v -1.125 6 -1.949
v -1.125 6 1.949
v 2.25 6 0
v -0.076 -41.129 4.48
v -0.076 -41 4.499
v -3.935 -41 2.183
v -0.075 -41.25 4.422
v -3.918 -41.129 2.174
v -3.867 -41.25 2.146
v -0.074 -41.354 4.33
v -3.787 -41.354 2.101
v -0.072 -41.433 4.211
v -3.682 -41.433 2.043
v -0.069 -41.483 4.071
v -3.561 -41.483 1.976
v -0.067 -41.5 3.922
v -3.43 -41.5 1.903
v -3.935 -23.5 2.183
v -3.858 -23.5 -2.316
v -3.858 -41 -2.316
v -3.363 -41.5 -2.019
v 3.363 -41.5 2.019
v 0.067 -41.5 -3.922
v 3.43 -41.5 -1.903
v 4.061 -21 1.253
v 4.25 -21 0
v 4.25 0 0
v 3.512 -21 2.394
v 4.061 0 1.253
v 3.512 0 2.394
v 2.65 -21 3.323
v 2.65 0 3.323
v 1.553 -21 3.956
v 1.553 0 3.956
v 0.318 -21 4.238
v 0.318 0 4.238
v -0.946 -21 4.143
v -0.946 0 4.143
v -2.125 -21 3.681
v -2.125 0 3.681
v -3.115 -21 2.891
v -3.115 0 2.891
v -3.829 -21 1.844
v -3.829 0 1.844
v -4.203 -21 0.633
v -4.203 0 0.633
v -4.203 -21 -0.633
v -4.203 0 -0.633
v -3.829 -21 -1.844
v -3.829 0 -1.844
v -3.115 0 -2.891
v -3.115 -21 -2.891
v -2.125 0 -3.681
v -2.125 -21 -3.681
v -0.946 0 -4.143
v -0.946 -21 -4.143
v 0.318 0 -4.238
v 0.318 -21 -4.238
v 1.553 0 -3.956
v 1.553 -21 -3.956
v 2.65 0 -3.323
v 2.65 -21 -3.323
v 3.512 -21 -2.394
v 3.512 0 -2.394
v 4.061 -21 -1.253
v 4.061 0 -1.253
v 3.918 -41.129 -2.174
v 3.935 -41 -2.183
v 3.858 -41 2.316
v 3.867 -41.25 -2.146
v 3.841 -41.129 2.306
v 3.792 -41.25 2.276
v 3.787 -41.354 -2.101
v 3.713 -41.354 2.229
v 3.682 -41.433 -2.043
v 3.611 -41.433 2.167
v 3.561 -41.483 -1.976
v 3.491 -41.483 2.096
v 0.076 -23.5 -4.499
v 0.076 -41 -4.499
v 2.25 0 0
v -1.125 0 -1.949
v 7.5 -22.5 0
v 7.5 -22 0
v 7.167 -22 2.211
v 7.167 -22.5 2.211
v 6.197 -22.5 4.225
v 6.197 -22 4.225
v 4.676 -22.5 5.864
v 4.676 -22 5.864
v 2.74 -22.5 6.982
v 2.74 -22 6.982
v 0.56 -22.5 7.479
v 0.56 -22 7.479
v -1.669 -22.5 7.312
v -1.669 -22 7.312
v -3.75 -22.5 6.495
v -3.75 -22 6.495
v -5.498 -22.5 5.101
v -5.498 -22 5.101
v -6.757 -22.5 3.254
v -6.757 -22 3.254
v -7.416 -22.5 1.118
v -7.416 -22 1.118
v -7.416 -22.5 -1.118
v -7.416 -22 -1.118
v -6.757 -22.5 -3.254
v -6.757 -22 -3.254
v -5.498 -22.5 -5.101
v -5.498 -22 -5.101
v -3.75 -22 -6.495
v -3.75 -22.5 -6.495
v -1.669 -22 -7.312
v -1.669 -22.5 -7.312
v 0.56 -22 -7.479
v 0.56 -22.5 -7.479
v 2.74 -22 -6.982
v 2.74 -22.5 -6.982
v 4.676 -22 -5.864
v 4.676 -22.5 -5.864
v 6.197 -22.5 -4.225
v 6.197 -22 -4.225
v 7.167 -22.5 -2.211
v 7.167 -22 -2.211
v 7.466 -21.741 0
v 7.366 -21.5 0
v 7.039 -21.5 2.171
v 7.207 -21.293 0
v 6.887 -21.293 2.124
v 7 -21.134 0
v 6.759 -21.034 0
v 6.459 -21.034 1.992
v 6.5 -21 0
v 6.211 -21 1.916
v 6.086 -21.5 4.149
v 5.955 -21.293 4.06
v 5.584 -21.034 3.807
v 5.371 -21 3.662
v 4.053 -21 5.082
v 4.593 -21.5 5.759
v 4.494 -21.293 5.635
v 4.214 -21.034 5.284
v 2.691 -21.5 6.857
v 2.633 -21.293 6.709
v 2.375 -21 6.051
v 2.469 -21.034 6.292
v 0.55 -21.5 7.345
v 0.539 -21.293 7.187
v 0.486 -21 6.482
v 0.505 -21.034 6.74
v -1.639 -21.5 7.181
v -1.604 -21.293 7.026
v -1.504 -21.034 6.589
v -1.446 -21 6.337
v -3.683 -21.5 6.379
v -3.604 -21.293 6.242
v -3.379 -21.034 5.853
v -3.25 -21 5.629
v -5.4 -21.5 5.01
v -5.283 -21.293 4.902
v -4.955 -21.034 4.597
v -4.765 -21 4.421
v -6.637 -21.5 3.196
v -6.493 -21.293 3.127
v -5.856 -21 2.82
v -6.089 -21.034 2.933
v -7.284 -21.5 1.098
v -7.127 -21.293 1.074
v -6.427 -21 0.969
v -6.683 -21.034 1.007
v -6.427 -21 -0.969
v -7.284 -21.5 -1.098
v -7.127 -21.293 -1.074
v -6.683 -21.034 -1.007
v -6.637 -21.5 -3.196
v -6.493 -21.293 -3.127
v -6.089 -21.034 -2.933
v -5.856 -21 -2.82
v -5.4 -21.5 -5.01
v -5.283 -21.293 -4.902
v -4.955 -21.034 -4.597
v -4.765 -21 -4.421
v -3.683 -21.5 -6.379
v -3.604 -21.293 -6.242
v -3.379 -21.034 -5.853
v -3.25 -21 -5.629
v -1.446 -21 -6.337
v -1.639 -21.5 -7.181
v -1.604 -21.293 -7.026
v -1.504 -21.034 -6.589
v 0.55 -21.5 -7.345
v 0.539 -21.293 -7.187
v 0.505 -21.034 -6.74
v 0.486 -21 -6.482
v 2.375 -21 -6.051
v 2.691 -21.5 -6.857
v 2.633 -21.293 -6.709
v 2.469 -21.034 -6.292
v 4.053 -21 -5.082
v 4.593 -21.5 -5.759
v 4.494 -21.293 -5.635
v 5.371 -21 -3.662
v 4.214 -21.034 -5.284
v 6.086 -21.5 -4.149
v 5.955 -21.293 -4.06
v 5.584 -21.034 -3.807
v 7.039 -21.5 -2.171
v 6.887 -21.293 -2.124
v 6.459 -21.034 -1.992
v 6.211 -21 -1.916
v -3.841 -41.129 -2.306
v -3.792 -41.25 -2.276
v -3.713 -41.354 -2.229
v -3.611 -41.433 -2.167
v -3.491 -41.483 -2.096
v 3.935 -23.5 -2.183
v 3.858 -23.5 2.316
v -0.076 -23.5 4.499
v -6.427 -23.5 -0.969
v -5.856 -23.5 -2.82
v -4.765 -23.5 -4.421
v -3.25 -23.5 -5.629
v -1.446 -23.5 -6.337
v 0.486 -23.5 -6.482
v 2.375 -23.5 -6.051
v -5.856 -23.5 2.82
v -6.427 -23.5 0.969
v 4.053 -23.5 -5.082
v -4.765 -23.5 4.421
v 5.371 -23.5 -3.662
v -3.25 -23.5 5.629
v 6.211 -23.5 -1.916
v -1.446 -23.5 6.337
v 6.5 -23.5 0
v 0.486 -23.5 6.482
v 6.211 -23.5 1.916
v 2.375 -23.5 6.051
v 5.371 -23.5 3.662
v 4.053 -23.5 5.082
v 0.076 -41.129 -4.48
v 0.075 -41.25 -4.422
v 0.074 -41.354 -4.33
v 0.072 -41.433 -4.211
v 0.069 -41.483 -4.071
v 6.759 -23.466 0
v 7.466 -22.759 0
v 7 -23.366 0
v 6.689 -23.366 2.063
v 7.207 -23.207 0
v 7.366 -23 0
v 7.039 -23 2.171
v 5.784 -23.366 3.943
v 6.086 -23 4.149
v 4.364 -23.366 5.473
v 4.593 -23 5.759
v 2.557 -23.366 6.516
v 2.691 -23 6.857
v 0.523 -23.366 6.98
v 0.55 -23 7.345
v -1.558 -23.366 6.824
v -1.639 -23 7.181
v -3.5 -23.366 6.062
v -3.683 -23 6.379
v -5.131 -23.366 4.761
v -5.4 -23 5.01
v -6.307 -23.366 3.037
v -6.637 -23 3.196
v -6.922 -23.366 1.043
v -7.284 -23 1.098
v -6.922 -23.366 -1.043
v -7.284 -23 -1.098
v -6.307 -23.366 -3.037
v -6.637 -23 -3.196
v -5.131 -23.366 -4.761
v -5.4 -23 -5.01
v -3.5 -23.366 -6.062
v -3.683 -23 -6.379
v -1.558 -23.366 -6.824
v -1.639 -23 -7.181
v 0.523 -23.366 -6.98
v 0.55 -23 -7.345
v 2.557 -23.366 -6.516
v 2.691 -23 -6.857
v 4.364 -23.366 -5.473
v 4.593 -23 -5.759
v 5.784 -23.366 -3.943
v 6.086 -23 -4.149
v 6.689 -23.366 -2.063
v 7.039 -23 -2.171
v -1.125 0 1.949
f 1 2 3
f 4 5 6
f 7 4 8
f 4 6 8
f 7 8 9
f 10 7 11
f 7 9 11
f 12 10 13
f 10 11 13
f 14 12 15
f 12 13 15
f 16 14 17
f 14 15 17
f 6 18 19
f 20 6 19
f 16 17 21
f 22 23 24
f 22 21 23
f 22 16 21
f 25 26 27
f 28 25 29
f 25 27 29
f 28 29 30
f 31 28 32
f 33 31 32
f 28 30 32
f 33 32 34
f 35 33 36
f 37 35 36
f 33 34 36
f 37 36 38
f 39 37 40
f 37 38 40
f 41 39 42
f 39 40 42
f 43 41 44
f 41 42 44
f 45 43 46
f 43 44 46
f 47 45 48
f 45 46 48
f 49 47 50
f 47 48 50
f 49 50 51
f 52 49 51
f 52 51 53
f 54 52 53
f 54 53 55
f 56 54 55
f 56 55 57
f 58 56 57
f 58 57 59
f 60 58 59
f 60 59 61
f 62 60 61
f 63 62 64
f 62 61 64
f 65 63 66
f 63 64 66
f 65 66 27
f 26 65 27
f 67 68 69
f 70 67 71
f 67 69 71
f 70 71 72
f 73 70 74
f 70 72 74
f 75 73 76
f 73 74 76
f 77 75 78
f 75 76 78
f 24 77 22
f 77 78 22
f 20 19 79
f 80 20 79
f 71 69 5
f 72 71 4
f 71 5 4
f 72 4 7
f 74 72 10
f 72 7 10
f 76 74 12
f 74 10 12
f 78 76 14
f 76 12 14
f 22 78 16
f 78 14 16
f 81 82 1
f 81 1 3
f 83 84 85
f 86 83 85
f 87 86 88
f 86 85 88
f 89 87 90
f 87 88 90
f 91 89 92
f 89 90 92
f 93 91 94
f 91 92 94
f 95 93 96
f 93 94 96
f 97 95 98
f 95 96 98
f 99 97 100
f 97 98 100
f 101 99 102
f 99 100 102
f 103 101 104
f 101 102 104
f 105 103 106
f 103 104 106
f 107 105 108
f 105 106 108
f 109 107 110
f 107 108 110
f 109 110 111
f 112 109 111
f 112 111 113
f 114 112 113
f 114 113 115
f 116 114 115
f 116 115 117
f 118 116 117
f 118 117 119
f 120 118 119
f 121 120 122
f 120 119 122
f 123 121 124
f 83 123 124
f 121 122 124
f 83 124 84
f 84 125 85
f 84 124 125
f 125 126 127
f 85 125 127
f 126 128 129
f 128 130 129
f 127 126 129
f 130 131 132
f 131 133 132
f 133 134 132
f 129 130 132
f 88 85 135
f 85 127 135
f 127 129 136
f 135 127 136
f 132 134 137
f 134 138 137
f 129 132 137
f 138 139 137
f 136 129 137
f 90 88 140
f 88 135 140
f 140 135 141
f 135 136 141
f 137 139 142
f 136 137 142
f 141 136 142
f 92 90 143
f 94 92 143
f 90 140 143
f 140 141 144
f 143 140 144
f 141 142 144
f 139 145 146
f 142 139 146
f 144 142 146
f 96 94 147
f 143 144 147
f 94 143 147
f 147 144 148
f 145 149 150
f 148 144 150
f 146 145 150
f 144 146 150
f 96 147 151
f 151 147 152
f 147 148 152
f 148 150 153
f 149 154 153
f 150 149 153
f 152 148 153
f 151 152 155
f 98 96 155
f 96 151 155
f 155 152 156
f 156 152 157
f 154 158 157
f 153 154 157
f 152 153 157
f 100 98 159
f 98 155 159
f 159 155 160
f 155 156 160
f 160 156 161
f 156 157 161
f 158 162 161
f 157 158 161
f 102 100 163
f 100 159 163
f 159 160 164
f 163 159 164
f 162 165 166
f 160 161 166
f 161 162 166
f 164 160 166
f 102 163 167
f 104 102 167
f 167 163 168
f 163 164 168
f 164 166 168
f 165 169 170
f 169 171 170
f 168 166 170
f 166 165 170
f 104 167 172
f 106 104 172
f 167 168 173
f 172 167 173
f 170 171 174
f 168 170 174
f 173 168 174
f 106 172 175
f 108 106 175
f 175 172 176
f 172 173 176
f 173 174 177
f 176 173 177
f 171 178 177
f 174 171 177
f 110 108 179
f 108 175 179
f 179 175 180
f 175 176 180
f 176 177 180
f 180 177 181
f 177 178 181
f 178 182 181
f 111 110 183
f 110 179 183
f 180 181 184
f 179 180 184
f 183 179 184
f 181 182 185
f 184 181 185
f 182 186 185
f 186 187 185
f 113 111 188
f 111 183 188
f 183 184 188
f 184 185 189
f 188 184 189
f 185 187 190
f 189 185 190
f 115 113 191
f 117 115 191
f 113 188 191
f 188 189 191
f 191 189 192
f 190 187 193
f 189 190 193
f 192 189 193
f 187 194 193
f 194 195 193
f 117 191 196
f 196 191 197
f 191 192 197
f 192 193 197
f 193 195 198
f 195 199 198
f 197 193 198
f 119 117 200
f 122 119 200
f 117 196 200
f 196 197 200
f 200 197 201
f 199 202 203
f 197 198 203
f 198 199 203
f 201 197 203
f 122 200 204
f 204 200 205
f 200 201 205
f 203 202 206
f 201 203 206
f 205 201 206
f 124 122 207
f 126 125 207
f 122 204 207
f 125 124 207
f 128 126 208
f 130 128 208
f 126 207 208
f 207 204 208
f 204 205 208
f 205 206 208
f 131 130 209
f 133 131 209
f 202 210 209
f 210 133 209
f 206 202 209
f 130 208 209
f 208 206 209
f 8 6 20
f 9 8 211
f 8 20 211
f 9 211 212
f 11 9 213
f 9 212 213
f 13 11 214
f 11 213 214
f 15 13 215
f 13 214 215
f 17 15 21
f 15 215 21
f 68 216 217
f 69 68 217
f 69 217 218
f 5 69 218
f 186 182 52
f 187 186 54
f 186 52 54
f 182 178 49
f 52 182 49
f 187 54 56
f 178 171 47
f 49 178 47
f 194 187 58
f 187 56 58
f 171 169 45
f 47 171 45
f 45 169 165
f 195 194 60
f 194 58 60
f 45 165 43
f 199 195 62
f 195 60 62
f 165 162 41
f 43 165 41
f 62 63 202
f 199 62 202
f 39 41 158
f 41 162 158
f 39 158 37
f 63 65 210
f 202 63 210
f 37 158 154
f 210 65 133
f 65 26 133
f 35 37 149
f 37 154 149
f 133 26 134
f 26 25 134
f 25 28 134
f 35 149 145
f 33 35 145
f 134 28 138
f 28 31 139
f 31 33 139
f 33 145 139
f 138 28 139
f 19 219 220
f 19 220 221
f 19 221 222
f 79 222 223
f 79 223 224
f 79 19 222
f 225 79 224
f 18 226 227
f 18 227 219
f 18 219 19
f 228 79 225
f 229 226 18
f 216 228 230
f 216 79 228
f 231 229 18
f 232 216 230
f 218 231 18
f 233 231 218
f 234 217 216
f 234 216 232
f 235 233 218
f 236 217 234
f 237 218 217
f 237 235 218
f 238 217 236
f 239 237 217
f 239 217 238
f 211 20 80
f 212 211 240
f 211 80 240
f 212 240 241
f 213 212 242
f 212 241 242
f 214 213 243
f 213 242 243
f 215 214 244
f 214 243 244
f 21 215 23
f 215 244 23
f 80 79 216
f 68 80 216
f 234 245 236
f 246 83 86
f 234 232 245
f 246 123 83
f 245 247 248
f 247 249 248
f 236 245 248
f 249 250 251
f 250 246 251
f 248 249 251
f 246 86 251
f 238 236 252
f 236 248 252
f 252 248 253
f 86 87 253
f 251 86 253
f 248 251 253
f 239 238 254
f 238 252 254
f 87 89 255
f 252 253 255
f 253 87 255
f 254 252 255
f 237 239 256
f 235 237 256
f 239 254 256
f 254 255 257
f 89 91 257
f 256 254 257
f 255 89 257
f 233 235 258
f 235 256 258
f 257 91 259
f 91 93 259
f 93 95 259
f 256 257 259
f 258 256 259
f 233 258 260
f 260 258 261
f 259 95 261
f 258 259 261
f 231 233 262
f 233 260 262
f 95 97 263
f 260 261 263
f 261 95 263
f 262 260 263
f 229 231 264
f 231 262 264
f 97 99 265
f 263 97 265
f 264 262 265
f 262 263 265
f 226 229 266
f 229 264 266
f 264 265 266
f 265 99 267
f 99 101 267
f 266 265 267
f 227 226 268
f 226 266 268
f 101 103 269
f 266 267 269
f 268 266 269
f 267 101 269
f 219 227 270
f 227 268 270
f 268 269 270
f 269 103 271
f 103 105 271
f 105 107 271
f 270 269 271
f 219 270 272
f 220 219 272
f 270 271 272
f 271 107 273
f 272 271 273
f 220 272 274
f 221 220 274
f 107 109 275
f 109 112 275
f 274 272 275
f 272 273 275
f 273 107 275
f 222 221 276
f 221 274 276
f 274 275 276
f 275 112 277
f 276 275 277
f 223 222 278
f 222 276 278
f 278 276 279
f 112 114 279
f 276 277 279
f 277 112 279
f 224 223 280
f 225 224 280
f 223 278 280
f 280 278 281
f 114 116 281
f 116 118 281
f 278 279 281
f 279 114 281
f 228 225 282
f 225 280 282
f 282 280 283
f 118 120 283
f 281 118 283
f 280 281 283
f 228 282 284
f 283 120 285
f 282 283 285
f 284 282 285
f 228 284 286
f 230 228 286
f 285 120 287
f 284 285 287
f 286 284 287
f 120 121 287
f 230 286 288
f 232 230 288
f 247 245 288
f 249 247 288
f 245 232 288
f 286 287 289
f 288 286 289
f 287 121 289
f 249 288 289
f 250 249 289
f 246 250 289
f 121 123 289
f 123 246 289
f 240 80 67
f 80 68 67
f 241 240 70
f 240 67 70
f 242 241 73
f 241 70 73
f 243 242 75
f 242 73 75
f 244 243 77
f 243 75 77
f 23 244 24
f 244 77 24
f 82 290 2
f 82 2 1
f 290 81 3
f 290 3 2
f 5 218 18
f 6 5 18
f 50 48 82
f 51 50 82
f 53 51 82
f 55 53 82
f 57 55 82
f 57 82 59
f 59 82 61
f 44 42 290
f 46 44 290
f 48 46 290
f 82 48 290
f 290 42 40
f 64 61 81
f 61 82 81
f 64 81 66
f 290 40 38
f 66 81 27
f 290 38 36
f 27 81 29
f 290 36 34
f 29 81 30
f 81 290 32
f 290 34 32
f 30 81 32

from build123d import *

# Parameters (mm, degrees)
F0_R     = 4.25
F1_DEPTH = 21
F2_DEPTH = 6
F3_R     = 7.5
F3_R_2   = 4.25
F4_DEPTH = 2.5
F6_DEPTH = 18
F7_R     = 0.5
F8_R     = 1


with BuildPart() as f1:
    # F0 (on Front) → F1 (new body)
    with BuildSketch(Plane.XZ):
        Circle(F0_R)
        Polygon((-1.125, 1.948557), (2.25, 0), (-1.125, -1.948557), align=None, mode=Mode.SUBTRACT)
        Polygon((-1.125, -1.948557), (2.25, 0), (-1.125, 1.948557), align=None)
    extrude(amount=F1_DEPTH)

    # F0 (on Front) → F2 (join)
    with BuildSketch(Plane.XZ):
        Polygon((-1.125, -1.948557), (2.25, 0), (-1.125, 1.948557), align=None)
    extrude(amount=-F2_DEPTH)

    # F3 (on face) → F4 (join)
    with BuildSketch(Plane.XZ.offset(21)):
        Circle(F3_R)
        Circle(F3_R_2, mode=Mode.SUBTRACT)
        Circle(F3_R_2)
    extrude(amount=F4_DEPTH)

    # F5 (on face) → F6 (join)
    with BuildSketch(Plane.XZ.offset(23.5)):
        Polygon((0.076423, -4.499351), (3.934764, -2.183492), (3.858341, 2.315859), (-0.076423, 4.499351), (-3.934764, 2.183492), (-3.858341, -2.315859), align=None)
    extrude(amount=F6_DEPTH)

    # F7
    f7_edges = [f1.edges().sort_by_distance(p)[0] for p in [
        (2.005593, -41.5, -3.341421),
        (-1.890959, -41.5, -3.407605),
        (-3.896552, -41.5, -0.066184),
        (-2.005593, -41.5, 3.341421),
        (1.890959, -41.5, 3.407605),
        (3.896552, -41.5, 0.066184),
    ]]
    fillet(f7_edges, radius=F7_R)

    # F8
    f8_edges = [f1.edges().sort_by_distance(p)[0] for p in [
        (-7.5, -23.5, 0),
        (-7.5, -21, 0),
    ]]
    fillet(f8_edges, radius=F8_R)


solid = f1.part
